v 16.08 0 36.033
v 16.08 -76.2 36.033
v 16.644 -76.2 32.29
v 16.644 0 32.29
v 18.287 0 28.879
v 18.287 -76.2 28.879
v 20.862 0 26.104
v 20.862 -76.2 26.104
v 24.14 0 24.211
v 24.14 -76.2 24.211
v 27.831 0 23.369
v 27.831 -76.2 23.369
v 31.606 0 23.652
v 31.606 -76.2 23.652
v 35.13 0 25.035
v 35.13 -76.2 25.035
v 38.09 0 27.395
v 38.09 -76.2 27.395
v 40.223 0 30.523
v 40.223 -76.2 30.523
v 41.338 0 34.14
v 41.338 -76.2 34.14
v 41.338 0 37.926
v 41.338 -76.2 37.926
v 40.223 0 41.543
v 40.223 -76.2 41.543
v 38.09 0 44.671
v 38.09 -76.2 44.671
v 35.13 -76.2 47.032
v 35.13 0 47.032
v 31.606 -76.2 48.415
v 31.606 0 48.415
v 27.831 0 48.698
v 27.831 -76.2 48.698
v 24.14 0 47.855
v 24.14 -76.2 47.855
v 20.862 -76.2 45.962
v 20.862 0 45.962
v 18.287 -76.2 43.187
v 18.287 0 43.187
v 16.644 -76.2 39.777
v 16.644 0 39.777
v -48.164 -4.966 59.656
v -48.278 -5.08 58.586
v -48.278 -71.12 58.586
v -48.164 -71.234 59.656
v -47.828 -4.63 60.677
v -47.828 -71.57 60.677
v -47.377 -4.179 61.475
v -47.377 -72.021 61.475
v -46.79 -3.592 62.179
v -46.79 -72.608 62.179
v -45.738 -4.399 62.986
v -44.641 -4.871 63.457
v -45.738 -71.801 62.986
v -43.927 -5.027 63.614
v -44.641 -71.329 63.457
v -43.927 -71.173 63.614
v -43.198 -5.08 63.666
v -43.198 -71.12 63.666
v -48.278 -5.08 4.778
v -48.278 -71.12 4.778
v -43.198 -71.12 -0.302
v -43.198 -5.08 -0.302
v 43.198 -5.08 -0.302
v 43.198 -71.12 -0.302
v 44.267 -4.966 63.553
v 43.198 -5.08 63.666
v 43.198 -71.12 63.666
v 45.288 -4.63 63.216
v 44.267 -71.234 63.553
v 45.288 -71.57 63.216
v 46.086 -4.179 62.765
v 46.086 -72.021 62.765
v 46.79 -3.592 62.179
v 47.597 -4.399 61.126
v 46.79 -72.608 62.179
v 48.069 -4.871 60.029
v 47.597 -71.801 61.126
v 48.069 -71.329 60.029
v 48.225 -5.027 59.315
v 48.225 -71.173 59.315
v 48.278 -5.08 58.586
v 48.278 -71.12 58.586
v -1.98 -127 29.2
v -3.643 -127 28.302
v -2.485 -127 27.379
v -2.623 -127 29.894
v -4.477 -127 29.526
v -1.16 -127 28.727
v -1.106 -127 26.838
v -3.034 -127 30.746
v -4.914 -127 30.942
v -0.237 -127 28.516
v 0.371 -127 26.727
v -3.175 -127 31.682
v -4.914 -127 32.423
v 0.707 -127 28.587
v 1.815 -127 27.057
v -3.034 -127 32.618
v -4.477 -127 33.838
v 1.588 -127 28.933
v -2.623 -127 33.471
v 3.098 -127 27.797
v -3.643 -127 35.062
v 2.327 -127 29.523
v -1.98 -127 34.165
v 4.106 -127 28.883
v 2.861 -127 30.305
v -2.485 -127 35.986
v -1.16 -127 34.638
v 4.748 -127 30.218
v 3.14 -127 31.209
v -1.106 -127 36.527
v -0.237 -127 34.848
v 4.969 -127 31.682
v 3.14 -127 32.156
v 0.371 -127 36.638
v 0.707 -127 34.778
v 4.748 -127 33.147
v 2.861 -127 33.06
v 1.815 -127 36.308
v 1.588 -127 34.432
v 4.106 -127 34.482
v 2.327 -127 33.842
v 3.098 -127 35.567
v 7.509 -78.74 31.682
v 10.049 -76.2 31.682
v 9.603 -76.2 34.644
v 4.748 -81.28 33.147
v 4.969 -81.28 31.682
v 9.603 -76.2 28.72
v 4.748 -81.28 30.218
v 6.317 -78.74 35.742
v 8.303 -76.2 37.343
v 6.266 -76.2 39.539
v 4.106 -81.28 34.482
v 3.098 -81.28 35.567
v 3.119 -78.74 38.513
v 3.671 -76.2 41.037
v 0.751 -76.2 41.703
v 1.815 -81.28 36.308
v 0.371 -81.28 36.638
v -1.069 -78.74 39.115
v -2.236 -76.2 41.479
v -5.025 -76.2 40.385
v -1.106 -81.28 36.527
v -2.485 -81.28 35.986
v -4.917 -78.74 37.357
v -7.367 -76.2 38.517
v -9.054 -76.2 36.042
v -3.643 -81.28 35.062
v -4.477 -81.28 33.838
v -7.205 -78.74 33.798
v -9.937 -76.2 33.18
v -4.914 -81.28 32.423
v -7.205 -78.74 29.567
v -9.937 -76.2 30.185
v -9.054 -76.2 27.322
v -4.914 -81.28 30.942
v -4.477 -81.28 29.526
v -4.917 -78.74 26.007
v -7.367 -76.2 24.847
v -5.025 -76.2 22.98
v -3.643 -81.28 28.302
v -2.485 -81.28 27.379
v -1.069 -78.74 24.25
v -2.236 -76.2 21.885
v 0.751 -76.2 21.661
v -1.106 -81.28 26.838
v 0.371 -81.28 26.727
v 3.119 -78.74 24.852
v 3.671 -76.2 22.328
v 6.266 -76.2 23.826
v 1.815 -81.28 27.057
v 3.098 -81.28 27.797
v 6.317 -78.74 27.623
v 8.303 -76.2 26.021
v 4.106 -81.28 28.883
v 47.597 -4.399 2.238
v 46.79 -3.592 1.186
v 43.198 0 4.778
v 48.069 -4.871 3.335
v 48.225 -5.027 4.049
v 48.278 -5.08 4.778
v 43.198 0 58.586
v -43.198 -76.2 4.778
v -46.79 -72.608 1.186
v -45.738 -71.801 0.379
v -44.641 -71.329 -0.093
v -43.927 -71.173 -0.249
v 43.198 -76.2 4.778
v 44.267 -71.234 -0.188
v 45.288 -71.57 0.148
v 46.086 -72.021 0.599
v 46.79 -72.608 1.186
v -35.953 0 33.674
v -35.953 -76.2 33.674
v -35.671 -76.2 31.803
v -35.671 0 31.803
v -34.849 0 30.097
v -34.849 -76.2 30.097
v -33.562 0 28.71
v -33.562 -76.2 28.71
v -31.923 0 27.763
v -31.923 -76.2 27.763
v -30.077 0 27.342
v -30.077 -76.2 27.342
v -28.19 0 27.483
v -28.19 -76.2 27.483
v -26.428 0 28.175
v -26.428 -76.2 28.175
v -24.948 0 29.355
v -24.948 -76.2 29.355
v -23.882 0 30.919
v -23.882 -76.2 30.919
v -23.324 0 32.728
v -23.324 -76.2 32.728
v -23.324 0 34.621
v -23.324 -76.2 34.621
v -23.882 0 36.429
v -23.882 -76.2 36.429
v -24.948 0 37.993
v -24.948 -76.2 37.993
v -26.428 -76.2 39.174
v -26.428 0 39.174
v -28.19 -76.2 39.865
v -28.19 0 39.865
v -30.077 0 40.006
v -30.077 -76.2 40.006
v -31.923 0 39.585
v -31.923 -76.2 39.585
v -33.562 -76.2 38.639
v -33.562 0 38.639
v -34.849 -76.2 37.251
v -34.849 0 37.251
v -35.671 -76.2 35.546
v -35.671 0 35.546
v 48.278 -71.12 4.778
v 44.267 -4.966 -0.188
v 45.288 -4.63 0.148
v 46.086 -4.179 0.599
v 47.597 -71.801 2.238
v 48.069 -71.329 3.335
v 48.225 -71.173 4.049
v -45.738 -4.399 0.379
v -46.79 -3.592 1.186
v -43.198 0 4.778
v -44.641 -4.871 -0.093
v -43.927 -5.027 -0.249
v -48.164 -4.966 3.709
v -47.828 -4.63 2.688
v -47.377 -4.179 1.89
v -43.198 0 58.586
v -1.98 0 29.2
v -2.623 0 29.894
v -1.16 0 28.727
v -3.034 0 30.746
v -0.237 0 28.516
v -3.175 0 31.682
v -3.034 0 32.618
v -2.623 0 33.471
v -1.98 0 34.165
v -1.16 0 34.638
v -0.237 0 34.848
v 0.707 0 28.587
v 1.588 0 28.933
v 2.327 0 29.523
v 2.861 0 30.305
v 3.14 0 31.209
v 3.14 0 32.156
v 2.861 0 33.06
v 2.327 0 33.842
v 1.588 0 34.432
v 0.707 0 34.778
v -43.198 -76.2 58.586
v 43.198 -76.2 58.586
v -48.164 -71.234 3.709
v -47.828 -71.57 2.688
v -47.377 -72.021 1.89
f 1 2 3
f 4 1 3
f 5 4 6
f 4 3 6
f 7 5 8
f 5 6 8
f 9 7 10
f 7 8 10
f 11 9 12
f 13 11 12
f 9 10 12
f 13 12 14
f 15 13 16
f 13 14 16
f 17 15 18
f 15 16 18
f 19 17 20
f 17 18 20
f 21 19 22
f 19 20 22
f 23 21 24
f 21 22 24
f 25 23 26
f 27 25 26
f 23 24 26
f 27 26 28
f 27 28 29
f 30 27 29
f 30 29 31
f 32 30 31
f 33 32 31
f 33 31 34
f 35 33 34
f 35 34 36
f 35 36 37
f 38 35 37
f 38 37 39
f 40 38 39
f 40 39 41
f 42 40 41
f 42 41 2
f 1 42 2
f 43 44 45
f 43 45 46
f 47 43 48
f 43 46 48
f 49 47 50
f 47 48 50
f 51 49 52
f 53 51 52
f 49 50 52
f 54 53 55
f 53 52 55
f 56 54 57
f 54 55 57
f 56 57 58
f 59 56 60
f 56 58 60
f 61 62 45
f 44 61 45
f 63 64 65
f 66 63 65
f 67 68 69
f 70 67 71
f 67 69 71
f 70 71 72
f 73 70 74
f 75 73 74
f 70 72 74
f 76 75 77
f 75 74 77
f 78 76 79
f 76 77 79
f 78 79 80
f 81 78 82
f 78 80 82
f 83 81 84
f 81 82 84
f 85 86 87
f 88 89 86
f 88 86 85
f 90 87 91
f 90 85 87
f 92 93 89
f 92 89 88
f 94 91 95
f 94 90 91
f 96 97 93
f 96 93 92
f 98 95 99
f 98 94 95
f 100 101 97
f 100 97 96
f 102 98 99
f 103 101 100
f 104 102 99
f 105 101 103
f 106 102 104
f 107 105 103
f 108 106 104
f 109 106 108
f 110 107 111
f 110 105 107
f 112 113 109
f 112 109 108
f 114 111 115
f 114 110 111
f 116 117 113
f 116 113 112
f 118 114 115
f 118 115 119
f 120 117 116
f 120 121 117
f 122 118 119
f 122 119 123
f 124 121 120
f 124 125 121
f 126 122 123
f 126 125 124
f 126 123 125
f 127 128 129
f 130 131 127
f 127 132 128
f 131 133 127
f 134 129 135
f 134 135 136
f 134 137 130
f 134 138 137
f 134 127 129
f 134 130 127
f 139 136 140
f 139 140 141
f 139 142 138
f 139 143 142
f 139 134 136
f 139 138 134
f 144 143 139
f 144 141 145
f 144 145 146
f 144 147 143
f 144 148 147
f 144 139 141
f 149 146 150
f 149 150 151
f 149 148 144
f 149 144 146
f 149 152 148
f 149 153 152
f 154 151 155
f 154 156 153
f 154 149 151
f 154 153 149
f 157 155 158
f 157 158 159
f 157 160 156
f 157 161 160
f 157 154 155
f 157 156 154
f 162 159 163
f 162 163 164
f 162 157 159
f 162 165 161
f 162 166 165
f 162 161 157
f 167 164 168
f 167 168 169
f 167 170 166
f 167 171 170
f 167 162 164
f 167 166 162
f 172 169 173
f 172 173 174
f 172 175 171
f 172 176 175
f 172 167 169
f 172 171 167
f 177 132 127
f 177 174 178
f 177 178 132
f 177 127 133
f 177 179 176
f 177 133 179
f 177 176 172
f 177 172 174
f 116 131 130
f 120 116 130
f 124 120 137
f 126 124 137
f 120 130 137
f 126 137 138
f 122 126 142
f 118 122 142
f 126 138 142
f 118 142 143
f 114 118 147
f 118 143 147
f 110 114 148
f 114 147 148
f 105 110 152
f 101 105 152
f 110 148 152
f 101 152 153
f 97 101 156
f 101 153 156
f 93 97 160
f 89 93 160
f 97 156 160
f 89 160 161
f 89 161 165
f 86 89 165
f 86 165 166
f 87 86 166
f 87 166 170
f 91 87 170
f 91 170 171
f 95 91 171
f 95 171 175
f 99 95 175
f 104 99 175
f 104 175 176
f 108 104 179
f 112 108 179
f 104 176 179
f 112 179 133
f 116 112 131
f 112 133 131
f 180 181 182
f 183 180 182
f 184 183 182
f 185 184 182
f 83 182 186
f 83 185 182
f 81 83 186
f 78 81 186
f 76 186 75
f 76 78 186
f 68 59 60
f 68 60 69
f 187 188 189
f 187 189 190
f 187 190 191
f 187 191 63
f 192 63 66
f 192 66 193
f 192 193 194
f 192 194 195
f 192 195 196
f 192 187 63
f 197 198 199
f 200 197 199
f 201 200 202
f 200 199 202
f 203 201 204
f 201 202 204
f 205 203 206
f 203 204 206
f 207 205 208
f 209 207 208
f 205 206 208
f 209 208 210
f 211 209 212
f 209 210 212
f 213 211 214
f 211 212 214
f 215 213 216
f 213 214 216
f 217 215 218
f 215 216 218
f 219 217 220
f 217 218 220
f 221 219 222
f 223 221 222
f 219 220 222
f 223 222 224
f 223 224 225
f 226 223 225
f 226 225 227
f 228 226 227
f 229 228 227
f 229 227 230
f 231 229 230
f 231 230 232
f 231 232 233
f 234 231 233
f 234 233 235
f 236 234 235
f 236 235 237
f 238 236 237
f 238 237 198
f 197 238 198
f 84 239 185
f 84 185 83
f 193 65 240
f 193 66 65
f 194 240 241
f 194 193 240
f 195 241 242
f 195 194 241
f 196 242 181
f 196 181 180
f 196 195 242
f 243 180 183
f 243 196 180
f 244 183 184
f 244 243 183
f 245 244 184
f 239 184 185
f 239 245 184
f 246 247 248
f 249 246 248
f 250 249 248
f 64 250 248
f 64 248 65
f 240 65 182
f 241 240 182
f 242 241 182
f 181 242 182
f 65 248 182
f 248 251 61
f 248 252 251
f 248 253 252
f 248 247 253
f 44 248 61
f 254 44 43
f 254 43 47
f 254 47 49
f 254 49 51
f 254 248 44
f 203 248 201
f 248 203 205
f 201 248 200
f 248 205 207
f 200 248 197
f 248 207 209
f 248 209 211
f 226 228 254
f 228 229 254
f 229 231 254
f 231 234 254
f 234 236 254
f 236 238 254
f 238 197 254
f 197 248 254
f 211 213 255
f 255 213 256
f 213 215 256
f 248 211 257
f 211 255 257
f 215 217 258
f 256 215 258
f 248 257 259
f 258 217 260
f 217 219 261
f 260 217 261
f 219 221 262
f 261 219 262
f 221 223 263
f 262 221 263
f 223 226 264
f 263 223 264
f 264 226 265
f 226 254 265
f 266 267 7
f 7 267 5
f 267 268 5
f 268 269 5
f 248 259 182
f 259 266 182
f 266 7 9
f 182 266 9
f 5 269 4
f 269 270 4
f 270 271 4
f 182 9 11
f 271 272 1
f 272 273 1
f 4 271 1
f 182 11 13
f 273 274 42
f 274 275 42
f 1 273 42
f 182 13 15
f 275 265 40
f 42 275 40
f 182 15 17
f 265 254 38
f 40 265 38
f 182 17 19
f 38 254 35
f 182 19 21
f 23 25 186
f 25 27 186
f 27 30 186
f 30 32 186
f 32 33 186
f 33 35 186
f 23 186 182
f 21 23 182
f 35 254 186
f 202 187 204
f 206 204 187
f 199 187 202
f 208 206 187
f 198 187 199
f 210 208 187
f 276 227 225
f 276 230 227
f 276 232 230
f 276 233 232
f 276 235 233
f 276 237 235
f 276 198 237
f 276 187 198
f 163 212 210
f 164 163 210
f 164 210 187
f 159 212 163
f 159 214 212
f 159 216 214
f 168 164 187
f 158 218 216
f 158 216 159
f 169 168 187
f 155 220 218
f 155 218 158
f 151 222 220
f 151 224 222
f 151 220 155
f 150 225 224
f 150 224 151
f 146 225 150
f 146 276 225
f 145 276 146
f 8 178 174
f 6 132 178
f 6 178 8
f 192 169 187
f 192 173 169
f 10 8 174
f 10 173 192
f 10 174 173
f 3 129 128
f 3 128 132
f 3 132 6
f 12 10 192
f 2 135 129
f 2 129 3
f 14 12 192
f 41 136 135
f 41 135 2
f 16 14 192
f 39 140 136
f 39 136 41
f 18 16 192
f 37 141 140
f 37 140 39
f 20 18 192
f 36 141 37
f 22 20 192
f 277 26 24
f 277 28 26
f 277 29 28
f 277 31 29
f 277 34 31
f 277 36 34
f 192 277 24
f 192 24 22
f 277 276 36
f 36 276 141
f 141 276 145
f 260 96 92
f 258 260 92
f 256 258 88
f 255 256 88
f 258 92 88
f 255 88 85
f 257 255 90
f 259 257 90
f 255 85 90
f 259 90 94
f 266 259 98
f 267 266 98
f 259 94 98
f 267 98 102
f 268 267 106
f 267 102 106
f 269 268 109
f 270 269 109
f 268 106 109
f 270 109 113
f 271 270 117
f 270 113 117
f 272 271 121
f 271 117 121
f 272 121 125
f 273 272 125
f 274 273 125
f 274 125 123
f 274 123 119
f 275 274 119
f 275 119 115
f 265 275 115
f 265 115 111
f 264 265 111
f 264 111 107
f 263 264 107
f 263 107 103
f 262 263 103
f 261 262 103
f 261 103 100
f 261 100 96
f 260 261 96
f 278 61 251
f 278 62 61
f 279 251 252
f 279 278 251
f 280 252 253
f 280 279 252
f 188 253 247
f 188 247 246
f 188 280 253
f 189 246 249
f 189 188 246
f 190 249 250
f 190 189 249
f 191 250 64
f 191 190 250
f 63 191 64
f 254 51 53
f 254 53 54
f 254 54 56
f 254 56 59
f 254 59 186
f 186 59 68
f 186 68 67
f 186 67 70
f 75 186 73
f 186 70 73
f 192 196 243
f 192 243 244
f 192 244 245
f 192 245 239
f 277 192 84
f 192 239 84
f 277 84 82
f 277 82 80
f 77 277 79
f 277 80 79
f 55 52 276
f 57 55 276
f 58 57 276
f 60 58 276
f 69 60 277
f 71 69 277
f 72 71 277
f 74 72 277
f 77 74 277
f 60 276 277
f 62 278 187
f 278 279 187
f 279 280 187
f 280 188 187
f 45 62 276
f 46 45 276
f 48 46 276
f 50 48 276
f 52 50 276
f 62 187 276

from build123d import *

# Parameters (mm, degrees)
F0_W     = 96.55572474
F0_H     = 63.9681667089
F1_DEPTH = 76.2
F2_R     = 4.9691003704
F3_DEPTH = 50.8
F4_SIZE  = 5.08
F5_SIZE  = 5.08
F6_D     = 12.7
F7_D     = 6.35
F8_R     = 5.08
F9_R     = 5.08
F10_D    = 25.4


with BuildPart() as f1:
    # F0 (on Front) → F1 (new body)
    with BuildSketch(Plane.XZ):
        with Locations((0, 31.6823422909)):
            Rectangle(F0_W, F0_H)
    extrude(amount=F1_DEPTH)

    # F2 (on face) → F3 (join)
    with BuildSketch(Plane.XZ.offset(76.2)):
        with Locations((0, 31.6823422909)):
            Circle(F2_R)
    extrude(amount=F3_DEPTH)

    # F4
    f4_edges = [f1.edges().sort_by_distance(p)[0] for p in [
        (48.277862, -76.2, 31.682342),
        (0, -76.2, -0.301741),
        (0, -76.2, 63.666426),
        (-48.277862, -76.2, 31.682342),
        (-4.9691, -76.2, 31.682342),
    ]]
    chamfer(f4_edges, length=F4_SIZE)

    # F5
    f5_edges = [f1.edges().sort_by_distance(p)[0] for p in [
        (48.277862, 0, 31.682342),
        (0, 0, 63.666426),
        (-48.277862, 0, 31.682342),
        (0, 0, -0.301741),
    ]]
    chamfer(f5_edges, length=F5_SIZE)

    # F6 (through all)
    with Locations(Plane(origin=(0, 0, 0), x_dir=(1, 0, 0), z_dir=(0, 1, 0))):
        with Locations((-29.6028293669, -33.6742401123)):
            Hole(F6_D / 2)

    # F7 (through all)
    with Locations(Plane(origin=(0, 0, 0), x_dir=(1, 0, 0), z_dir=(0, 1, 0))):
        with Locations((0, -31.6823422909)):
            Hole(F7_D / 2)

    # F8
    f8_edges = [f1.edges().sort_by_distance(p)[0] for p in [
        (-48.277862, -38.1, -0.301741),
    ]]
    fillet(f8_edges, radius=F8_R)

    # F9
    f9_edges = [f1.edges().sort_by_distance(p)[0] for p in [
        (48.277862, -38.1, -0.301741),
        (48.277862, -38.1, 63.666426),
        (-48.277862, -38.1, 63.666426),
    ]]
    fillet(f9_edges, radius=F9_R)

    # F10 (through all)
    with Locations(Plane(origin=(0, 0, 0), x_dir=(1, 0, 0), z_dir=(0, 1, 0))):
        with Locations((28.7802238017, -36.0331609845)):
            Hole(F10_D / 2)


solid = f1.part
